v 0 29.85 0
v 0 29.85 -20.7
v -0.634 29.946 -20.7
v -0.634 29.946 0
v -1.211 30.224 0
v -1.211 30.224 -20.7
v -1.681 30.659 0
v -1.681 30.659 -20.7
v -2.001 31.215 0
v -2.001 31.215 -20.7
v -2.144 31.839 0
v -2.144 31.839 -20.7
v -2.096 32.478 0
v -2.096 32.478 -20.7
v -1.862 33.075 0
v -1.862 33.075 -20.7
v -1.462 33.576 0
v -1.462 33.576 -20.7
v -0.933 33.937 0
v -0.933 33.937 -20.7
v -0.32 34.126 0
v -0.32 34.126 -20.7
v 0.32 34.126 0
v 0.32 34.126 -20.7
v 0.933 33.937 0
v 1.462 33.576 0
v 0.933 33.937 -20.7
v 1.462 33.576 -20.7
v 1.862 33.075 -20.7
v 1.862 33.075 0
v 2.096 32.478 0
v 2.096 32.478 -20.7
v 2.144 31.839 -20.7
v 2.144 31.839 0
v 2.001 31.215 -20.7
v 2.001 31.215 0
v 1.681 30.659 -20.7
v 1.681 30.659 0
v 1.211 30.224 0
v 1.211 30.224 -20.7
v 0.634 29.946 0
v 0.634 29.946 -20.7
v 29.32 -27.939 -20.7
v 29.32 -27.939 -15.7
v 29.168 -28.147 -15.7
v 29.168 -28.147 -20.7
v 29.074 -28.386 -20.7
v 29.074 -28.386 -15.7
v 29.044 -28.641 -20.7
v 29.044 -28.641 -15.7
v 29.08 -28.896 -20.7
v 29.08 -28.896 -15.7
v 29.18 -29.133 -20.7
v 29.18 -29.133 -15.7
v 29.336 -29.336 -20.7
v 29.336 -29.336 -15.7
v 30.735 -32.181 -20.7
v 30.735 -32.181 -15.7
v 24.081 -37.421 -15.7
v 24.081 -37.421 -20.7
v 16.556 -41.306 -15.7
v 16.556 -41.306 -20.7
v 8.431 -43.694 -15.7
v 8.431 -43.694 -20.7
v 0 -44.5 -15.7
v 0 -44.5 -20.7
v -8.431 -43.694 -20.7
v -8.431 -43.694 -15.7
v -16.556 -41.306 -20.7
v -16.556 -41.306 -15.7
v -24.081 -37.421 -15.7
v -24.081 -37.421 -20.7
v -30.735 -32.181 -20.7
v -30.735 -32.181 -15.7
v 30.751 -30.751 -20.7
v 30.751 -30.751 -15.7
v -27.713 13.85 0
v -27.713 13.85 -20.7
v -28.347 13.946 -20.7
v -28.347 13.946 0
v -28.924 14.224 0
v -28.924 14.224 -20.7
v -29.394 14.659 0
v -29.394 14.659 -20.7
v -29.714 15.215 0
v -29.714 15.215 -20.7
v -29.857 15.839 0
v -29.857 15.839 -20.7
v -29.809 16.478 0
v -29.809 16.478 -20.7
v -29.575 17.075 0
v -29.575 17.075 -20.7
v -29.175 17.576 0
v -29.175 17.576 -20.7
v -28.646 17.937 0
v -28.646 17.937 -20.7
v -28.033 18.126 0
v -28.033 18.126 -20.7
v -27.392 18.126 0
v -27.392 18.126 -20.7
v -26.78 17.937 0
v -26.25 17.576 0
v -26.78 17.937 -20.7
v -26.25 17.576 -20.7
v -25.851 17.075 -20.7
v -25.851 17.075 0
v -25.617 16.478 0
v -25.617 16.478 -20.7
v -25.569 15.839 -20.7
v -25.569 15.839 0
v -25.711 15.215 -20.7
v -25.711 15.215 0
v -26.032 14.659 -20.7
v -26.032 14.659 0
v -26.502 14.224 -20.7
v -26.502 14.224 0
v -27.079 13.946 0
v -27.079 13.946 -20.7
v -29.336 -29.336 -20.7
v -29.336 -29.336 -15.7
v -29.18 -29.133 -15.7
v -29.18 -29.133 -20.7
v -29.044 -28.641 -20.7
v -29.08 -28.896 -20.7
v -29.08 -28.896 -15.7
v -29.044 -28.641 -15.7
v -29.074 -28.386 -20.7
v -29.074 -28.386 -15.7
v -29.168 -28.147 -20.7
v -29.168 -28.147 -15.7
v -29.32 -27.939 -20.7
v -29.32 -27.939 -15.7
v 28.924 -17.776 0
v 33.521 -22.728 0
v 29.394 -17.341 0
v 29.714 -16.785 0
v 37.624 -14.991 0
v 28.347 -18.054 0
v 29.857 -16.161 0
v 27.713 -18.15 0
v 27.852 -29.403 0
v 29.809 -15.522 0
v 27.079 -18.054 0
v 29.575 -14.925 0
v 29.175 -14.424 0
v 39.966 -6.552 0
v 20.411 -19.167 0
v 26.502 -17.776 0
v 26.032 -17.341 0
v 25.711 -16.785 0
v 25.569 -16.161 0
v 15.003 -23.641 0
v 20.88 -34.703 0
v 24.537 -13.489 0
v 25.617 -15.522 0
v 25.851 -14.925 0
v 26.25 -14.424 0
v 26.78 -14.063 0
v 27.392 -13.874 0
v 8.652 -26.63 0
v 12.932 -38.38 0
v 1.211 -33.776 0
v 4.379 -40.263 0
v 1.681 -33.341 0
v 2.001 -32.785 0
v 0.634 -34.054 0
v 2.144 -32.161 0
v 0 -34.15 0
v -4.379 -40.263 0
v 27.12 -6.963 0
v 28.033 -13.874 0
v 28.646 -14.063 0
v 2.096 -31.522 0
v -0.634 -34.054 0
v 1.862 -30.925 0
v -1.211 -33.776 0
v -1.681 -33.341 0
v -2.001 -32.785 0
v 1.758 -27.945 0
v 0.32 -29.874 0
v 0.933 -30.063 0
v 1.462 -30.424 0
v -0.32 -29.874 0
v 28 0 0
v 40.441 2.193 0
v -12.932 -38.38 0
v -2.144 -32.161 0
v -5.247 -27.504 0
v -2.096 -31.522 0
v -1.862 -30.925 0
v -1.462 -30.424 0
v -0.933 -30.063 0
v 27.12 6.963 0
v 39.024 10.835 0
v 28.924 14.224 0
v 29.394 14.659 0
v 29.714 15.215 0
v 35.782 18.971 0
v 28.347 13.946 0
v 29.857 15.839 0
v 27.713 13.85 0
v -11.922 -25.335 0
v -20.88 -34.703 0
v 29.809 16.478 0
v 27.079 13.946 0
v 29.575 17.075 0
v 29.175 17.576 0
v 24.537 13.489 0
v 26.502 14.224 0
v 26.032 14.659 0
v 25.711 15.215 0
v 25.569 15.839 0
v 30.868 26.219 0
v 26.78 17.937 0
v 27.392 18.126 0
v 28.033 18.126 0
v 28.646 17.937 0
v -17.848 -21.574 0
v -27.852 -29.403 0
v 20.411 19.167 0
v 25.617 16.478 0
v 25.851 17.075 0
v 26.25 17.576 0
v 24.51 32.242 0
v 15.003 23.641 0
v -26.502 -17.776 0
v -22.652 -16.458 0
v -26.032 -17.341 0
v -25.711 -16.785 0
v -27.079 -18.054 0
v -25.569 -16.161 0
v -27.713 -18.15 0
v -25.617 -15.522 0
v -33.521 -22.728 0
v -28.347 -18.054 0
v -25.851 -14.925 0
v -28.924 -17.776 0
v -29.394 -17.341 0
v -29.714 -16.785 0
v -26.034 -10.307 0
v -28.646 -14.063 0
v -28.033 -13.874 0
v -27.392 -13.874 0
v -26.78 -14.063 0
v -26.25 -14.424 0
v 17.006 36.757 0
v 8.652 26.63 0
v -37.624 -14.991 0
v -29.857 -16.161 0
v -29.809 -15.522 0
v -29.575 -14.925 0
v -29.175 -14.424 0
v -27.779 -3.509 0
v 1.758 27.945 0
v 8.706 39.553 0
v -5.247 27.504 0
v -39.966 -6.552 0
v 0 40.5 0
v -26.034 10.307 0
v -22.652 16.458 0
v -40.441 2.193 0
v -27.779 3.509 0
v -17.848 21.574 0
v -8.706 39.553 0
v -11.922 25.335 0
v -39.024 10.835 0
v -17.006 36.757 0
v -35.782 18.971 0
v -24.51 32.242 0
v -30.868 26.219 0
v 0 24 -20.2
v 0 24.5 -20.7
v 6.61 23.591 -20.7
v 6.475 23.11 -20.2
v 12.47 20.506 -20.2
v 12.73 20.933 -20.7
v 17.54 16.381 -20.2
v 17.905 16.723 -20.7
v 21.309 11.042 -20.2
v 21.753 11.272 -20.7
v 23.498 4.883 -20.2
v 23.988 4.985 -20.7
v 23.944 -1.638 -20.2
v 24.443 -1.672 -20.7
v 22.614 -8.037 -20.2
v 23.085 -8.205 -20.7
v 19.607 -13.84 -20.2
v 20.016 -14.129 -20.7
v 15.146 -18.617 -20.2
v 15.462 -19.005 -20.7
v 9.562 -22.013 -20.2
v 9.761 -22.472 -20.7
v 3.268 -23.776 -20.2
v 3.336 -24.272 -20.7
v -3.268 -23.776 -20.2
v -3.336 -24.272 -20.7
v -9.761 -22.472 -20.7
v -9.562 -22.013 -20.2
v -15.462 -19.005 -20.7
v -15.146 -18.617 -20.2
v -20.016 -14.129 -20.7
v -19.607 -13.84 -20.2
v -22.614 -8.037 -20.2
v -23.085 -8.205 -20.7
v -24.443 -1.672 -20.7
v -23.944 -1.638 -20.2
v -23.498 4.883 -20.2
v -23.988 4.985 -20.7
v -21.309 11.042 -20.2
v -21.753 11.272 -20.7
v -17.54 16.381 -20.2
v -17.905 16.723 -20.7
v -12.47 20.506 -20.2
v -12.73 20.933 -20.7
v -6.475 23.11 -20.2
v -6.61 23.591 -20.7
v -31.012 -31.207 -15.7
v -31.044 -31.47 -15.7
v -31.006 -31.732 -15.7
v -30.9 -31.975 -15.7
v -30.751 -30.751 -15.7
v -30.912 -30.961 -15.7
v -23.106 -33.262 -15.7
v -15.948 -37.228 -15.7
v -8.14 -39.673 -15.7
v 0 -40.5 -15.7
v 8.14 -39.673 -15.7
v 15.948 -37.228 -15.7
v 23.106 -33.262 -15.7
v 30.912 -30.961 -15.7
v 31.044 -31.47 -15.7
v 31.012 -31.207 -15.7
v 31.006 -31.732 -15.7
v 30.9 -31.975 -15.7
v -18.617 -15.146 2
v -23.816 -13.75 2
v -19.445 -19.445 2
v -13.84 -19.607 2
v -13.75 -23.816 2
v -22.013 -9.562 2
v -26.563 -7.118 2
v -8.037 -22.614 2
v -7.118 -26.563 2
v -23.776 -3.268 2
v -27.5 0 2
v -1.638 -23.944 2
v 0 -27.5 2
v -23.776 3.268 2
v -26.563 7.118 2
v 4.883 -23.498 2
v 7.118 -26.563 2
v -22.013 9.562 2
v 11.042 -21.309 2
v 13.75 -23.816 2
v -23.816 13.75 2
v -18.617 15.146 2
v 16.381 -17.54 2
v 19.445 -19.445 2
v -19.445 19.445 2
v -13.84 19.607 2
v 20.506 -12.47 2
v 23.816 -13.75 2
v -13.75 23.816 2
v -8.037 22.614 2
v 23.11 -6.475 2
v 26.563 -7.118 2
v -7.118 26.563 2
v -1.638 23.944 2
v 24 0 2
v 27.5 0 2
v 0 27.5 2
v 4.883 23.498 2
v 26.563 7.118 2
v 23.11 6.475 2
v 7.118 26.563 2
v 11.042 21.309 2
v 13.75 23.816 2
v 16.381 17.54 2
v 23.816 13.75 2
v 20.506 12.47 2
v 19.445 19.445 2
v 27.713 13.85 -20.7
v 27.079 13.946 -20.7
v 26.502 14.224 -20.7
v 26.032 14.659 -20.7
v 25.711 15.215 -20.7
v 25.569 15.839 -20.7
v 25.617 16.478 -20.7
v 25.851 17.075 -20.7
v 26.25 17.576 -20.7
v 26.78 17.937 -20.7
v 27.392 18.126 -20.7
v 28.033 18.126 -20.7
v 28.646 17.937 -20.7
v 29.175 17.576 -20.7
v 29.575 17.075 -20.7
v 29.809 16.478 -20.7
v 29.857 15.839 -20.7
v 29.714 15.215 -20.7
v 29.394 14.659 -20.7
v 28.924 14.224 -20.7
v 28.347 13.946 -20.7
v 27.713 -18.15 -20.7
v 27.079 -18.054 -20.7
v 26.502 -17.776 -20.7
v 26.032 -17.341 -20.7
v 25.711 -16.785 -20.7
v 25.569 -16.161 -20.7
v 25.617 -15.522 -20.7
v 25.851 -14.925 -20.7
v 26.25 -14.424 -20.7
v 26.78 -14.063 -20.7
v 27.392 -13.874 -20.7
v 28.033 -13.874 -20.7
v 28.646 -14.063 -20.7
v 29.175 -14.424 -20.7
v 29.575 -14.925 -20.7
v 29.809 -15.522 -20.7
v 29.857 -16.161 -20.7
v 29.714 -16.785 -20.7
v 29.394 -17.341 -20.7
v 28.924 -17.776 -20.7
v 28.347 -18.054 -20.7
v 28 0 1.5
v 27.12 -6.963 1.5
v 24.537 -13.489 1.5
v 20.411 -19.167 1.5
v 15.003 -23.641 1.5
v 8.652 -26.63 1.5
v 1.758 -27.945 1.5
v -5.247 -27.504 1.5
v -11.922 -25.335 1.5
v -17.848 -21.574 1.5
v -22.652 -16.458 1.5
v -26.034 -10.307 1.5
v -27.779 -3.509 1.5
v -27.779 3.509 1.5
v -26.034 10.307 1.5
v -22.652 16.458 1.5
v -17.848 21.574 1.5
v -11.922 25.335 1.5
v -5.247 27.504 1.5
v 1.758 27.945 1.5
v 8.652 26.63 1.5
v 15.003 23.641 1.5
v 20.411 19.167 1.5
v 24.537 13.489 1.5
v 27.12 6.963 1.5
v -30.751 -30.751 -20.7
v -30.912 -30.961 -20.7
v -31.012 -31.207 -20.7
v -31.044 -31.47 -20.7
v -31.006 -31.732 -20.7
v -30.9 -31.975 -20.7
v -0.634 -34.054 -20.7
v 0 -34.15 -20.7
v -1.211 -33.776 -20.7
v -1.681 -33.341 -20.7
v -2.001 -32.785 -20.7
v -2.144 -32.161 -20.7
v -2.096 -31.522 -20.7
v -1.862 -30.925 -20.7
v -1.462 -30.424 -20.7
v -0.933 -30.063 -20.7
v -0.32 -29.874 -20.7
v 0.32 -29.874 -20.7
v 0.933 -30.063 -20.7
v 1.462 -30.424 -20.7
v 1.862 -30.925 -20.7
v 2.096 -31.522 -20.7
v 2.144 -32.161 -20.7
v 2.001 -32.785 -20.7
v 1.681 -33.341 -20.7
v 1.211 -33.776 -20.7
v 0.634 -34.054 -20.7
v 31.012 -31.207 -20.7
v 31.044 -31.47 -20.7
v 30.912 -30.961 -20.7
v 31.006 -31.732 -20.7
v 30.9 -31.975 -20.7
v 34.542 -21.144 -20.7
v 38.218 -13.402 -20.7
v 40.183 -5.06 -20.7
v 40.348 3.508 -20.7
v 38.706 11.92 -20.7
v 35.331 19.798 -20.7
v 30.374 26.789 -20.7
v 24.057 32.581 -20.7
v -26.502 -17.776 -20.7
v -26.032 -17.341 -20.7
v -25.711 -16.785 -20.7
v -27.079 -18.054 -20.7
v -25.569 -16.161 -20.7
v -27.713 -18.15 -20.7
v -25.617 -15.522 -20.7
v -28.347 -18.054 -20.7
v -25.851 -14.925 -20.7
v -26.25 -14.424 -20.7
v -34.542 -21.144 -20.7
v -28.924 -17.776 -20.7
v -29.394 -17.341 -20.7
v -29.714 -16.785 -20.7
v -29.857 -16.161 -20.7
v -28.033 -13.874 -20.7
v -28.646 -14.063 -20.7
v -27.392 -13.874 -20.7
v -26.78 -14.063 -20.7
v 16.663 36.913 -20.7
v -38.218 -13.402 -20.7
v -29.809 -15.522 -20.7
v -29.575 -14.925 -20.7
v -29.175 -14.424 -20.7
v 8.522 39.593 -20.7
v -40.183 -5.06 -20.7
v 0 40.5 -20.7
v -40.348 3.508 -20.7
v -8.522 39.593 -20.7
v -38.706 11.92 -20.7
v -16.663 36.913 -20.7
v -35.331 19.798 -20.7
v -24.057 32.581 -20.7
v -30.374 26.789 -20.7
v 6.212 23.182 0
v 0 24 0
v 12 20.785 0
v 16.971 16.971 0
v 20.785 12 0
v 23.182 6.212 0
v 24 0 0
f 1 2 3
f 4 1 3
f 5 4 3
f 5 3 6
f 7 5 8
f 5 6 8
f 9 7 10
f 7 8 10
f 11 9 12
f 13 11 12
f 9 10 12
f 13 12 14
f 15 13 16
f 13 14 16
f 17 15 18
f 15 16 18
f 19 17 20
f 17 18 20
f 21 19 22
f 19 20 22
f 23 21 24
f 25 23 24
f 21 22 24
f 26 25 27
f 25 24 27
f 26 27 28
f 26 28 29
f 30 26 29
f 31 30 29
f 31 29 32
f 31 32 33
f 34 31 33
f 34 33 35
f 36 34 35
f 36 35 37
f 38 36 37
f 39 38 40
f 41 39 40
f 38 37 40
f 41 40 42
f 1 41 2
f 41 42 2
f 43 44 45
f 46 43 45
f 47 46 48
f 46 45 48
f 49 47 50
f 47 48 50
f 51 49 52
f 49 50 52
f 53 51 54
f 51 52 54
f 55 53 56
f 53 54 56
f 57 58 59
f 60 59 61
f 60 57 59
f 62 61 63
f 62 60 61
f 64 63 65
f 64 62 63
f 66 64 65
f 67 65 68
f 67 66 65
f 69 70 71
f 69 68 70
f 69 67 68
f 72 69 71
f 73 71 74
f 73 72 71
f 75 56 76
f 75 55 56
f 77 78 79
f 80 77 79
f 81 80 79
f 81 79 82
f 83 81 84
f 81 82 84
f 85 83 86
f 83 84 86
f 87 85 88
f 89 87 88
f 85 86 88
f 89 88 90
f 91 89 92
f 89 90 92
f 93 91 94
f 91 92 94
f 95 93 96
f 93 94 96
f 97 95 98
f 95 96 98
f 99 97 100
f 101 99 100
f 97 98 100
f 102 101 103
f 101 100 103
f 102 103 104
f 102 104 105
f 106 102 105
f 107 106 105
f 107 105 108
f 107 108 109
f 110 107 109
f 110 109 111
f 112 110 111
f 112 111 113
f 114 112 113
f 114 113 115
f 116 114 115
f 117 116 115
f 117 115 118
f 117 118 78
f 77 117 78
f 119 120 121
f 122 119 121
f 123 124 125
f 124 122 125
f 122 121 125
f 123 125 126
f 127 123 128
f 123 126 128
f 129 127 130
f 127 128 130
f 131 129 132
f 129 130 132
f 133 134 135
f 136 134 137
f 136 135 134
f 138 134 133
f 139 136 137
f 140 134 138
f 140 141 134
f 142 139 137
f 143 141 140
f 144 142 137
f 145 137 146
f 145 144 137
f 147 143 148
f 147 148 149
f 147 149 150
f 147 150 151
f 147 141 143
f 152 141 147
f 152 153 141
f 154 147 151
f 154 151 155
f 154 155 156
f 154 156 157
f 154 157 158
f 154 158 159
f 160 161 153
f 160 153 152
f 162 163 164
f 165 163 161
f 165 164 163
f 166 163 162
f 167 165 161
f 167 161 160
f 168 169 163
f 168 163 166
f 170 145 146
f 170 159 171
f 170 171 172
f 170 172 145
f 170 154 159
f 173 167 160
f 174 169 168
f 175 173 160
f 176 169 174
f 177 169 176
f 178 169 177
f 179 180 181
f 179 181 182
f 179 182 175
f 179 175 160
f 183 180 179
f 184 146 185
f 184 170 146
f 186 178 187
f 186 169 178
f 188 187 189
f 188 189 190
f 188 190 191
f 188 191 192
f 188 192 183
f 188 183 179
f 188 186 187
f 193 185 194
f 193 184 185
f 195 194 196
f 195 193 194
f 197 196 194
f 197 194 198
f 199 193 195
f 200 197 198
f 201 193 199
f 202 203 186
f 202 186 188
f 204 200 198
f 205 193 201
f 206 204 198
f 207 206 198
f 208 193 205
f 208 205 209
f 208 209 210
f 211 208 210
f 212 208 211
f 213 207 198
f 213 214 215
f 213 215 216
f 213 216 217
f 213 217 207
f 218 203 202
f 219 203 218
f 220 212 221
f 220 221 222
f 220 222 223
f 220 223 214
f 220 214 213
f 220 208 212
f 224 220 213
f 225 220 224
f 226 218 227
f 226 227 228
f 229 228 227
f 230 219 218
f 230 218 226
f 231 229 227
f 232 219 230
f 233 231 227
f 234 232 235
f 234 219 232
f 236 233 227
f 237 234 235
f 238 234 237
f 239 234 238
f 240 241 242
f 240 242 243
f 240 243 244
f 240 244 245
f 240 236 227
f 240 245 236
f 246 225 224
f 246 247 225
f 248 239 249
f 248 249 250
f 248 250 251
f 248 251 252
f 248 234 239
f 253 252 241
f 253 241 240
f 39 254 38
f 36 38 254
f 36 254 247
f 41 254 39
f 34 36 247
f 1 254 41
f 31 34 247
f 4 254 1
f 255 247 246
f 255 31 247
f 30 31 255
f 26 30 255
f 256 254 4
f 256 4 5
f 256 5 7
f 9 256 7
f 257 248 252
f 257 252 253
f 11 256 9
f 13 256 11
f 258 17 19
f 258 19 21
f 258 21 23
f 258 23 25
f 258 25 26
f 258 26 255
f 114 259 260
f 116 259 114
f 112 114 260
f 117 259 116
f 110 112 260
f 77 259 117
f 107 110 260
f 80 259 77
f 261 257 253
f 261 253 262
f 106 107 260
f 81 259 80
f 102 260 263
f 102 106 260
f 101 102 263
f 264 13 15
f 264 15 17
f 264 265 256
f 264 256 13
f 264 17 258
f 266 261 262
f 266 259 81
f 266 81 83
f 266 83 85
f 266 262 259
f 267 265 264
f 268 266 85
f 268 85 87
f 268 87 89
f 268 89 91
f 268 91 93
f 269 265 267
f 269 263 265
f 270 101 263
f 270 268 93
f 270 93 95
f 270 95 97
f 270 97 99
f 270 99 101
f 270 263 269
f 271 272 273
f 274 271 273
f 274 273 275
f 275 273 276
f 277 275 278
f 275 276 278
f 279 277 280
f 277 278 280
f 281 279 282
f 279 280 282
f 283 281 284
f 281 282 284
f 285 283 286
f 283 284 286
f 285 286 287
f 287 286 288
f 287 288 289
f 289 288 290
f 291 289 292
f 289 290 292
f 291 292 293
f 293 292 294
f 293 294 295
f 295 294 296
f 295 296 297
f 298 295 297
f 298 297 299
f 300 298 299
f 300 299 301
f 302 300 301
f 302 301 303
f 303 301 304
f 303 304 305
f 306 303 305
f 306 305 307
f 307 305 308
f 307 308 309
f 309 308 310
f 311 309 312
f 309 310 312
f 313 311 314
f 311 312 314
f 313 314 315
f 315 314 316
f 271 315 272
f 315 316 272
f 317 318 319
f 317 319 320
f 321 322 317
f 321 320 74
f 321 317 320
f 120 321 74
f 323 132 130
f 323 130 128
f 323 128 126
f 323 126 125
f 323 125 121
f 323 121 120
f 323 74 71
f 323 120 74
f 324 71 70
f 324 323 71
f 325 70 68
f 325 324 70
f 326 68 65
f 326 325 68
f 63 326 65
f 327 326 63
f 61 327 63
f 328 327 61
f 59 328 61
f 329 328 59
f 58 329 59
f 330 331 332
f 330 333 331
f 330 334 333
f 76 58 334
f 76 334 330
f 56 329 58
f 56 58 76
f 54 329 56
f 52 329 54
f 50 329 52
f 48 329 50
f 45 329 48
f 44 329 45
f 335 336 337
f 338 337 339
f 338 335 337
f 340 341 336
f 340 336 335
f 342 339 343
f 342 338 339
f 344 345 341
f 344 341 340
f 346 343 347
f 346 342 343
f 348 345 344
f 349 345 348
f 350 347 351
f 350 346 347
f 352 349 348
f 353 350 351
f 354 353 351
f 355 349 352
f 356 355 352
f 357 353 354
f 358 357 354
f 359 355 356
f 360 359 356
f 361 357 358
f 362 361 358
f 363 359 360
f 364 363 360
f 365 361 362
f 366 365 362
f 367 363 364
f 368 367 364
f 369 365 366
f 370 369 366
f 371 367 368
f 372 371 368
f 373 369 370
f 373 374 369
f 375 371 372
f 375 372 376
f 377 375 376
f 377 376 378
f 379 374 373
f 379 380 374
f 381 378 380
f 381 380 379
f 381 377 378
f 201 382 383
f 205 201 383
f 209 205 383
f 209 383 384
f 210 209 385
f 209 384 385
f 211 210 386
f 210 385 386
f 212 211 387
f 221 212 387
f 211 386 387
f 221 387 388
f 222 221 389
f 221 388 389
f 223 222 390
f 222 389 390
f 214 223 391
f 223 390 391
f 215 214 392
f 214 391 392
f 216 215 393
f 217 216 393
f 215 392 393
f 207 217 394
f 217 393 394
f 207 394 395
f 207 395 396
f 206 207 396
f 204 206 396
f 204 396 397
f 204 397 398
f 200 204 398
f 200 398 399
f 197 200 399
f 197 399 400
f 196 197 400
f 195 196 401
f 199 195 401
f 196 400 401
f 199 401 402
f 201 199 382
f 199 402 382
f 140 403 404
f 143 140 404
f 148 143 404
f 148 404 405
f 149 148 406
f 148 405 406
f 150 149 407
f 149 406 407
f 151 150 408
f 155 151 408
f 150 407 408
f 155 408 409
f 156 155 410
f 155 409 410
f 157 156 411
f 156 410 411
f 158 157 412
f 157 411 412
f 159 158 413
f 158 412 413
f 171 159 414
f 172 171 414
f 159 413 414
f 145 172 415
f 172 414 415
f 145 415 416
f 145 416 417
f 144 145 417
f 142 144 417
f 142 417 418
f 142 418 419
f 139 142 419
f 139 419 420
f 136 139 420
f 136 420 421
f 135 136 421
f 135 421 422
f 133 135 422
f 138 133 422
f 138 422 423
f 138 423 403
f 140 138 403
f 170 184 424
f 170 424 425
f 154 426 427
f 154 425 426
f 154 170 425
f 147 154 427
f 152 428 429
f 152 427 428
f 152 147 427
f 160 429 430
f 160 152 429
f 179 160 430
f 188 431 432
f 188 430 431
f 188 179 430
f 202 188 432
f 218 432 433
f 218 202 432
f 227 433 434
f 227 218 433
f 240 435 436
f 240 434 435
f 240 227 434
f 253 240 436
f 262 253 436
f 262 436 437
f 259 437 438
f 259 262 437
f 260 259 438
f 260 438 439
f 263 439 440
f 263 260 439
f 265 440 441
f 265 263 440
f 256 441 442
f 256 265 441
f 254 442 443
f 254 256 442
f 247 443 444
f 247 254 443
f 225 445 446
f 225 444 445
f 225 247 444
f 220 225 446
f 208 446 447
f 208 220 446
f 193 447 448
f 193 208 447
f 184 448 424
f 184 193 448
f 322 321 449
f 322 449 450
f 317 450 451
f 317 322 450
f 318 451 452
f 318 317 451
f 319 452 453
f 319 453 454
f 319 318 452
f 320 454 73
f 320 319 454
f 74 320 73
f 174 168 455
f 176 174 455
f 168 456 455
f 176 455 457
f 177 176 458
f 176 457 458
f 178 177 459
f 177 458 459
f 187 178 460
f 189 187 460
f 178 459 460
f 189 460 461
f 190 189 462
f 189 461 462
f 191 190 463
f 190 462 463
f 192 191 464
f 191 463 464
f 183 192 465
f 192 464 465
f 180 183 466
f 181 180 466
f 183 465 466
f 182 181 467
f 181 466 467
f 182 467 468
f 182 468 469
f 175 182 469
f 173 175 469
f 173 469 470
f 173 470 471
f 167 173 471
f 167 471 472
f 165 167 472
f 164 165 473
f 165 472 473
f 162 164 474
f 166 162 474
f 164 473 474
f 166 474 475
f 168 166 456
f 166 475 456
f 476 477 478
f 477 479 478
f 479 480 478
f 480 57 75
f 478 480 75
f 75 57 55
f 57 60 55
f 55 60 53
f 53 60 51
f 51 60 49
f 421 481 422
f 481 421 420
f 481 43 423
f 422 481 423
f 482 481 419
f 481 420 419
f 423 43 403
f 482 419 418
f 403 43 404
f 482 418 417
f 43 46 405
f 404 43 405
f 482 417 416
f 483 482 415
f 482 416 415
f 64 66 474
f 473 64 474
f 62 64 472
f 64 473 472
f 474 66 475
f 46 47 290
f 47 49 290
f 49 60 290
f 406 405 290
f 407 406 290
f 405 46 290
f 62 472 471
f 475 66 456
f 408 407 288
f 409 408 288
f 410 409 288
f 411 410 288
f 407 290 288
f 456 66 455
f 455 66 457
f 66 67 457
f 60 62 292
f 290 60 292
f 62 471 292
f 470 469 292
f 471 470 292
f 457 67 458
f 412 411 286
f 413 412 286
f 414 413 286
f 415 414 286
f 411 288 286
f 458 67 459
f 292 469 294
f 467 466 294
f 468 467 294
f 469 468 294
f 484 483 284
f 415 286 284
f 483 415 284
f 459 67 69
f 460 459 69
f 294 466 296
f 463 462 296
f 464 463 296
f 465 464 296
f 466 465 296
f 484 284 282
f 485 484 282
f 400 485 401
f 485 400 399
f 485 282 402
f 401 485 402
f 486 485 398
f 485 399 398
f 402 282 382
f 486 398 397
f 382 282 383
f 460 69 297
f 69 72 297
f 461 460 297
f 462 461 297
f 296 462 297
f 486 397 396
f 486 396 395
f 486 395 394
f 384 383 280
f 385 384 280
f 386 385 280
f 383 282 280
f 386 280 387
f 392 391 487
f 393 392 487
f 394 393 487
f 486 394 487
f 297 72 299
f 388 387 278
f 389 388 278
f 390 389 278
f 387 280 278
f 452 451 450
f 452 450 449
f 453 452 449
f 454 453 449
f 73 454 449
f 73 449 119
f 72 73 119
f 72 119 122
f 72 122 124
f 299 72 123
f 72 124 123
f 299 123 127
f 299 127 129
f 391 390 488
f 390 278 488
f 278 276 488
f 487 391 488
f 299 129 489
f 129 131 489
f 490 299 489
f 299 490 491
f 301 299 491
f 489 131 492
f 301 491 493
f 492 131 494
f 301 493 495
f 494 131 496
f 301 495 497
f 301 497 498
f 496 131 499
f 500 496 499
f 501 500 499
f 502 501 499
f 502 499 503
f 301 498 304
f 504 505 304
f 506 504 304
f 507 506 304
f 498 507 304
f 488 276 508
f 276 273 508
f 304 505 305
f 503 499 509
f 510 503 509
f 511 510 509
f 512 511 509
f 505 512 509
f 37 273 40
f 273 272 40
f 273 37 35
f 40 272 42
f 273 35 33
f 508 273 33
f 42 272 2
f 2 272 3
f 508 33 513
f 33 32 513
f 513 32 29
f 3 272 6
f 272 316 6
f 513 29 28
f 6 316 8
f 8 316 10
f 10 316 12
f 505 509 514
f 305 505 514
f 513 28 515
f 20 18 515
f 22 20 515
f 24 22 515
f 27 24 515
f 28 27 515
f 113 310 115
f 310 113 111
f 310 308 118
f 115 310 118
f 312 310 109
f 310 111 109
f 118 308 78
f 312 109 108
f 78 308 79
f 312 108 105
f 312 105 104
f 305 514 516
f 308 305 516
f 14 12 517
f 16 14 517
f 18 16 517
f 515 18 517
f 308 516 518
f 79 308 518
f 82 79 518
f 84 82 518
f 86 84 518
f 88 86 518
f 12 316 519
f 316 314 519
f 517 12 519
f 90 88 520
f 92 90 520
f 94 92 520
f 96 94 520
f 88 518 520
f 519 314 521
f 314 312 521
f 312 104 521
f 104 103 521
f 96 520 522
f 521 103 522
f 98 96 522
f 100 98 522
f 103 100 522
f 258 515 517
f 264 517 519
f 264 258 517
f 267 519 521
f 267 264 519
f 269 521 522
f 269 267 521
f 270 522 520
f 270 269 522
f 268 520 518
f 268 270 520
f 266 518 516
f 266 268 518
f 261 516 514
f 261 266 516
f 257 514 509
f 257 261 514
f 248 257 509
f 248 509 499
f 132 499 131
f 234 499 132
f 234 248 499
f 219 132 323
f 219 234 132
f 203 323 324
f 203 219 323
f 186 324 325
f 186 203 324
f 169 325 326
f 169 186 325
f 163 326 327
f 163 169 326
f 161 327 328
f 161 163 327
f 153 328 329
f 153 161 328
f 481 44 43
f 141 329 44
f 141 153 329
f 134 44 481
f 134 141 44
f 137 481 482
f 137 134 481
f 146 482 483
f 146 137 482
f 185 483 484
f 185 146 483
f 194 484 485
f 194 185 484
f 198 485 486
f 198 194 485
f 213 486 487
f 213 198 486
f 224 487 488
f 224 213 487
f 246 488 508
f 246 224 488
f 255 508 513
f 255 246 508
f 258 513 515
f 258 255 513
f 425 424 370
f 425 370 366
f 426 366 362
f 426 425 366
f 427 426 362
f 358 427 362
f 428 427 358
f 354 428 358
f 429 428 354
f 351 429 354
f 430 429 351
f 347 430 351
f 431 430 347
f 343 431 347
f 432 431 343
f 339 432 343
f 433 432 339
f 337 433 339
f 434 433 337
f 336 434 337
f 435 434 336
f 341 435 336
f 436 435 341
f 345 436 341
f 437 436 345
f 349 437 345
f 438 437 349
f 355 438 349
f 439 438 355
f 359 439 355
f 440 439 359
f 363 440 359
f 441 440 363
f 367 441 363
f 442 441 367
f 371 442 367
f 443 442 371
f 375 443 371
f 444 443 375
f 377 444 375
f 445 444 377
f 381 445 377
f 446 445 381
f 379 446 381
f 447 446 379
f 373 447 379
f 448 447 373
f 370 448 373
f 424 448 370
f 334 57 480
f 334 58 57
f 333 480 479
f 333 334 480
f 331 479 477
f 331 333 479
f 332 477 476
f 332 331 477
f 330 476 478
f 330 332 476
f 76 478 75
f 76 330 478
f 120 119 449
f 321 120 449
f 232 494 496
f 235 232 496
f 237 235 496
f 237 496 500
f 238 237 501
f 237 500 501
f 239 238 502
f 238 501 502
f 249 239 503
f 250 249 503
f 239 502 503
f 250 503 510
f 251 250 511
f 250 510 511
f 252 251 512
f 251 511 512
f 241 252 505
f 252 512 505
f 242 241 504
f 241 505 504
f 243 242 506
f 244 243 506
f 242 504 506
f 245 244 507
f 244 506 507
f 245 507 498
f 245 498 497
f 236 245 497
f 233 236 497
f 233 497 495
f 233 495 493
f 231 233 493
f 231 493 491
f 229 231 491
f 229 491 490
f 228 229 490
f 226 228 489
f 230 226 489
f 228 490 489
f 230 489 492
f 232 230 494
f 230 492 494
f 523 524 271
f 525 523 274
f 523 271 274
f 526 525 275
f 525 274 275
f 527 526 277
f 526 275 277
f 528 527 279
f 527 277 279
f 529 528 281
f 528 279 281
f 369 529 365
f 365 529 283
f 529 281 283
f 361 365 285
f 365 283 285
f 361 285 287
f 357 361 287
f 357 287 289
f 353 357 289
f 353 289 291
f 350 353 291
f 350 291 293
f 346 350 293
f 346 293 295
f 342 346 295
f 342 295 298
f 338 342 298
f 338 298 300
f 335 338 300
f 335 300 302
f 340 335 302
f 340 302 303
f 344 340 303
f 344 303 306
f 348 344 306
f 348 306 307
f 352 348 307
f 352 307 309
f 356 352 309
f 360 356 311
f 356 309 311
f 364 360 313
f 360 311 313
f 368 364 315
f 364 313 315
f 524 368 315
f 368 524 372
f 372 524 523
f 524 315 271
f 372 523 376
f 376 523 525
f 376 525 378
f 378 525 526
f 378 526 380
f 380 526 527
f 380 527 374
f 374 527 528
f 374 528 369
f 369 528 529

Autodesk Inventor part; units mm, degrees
ref_plane "YZ Plane" through (0, 0, 0) normal (1, 0, 0) x (0, 1, 0)
ref_plane "XZ Plane" through (0, 0, 0) normal (0, 1, 0) x (-1, 0, 0)
ref_plane "XY Plane" through (0, 0, 0) normal (0, 0, 1) x (1, 0, 0)
sketch "スケッチ1" plane through (0, 0, 0) normal (1, 0, 0) x (0, 1, 0)
  line L0 (40.5, 0) -> (24, 0)
  line L1 (24, 0) -> (24, -20.7)
  line L2 (24, -20.7) -> (40.5, -20.7)
  line L3 (40.5, -20.7) -> (40.5, 0)
  line L4 (0, -24.84) -> (0, 4.14) projected
  point P0 (0, 0)
  dimension "d0" = 24
  dimension "d2" = 40.5
  dimension "d3" = 20.7
revolve "回転1" add sketch "スケッチ1" angle 360 about axis through (0, 0, -10) along (0, 0, 1)
sketch "スケッチ2" plane through (0, 0, 0) normal (0, 0, 1) x (1, 0, 0)
  circle A0 centre (0, 0) radius 32
  point P0 (0, 32)
  point P1 (-27.7128, 16)
  point P2 (-27.7128, -16)
  point P3 (0, -32)
  point P4 (27.7128, -16)
  point P5 (27.7128, 16)
  dimension "d5" = 64
  dimension "d8" = 360
hole "穴1" at (0, 32, 0) at (-27.7128, 16, 0) at (-27.7128, -16, 0) at (0, -32, 0) at (27.7128, -16, 0) at (27.7128, 16, 0) direction (0, 0, -1) diameter 4.3 end through all clearance for "Socket Head Cap Screw" size "M4" standard "Ansi Metric M Profile"
sketch "スケッチ3" plane through (0, 0, -20.7) normal (0, 0, 1) x (1, 0, 0)
  circle A0 centre (0, 0) radius 40.5 projected
  circle A1 centre (0, 0) radius 44.5
  line L0 (0, 0) -> (-31.4663, -31.4663)
  line L1 (0, 0) -> (31.4663, -31.4663)
  line L2 (0, 62.3) -> (0, -62.3) projected
  point P0 (-28.6378, -28.6378)
  point P1 (28.6378, -28.6378)
  point P2 (19.901, -39.802)
  dimension "d17" = 4
  dimension "d23" = 45
  dimension "d24" = 45
extrude "押し出し1" add sketch "スケッチ3" along normal blind 5 contours L1 A1 L2 A0 | A0 L2 A1 L0 picked at (28.2757, -32.3682) picked at (-28.2757, -32.3682)
fillet "フィレット1" radius 1 4 edges at (-31.4663, -31.4663, -18.2) (31.4663, -31.4663, -18.2) (28.6378, -28.6378, -18.2) (-28.6378, -28.6378, -18.2)
sketch "スケッチ5" plane through (0, 0, 0) normal (0, 0, 1) x (1, 0, 0)
  circle A0 centre (0, 0) radius 24 projected
  circle A1 centre (0, 0) radius 28
  dimension "d28" = 4
extrude "押し出し3" add sketch "スケッチ5" along normal blind 2
chamfer "面取り1" distance 0.5 angle 45 1 edges at (-28, 0, 2)
chamfer "面取り2" distance 0.5 angle 45 1 edges at (0, -24, -20.7)
properties part number "unit-base7" material "ABS プラスチック"
